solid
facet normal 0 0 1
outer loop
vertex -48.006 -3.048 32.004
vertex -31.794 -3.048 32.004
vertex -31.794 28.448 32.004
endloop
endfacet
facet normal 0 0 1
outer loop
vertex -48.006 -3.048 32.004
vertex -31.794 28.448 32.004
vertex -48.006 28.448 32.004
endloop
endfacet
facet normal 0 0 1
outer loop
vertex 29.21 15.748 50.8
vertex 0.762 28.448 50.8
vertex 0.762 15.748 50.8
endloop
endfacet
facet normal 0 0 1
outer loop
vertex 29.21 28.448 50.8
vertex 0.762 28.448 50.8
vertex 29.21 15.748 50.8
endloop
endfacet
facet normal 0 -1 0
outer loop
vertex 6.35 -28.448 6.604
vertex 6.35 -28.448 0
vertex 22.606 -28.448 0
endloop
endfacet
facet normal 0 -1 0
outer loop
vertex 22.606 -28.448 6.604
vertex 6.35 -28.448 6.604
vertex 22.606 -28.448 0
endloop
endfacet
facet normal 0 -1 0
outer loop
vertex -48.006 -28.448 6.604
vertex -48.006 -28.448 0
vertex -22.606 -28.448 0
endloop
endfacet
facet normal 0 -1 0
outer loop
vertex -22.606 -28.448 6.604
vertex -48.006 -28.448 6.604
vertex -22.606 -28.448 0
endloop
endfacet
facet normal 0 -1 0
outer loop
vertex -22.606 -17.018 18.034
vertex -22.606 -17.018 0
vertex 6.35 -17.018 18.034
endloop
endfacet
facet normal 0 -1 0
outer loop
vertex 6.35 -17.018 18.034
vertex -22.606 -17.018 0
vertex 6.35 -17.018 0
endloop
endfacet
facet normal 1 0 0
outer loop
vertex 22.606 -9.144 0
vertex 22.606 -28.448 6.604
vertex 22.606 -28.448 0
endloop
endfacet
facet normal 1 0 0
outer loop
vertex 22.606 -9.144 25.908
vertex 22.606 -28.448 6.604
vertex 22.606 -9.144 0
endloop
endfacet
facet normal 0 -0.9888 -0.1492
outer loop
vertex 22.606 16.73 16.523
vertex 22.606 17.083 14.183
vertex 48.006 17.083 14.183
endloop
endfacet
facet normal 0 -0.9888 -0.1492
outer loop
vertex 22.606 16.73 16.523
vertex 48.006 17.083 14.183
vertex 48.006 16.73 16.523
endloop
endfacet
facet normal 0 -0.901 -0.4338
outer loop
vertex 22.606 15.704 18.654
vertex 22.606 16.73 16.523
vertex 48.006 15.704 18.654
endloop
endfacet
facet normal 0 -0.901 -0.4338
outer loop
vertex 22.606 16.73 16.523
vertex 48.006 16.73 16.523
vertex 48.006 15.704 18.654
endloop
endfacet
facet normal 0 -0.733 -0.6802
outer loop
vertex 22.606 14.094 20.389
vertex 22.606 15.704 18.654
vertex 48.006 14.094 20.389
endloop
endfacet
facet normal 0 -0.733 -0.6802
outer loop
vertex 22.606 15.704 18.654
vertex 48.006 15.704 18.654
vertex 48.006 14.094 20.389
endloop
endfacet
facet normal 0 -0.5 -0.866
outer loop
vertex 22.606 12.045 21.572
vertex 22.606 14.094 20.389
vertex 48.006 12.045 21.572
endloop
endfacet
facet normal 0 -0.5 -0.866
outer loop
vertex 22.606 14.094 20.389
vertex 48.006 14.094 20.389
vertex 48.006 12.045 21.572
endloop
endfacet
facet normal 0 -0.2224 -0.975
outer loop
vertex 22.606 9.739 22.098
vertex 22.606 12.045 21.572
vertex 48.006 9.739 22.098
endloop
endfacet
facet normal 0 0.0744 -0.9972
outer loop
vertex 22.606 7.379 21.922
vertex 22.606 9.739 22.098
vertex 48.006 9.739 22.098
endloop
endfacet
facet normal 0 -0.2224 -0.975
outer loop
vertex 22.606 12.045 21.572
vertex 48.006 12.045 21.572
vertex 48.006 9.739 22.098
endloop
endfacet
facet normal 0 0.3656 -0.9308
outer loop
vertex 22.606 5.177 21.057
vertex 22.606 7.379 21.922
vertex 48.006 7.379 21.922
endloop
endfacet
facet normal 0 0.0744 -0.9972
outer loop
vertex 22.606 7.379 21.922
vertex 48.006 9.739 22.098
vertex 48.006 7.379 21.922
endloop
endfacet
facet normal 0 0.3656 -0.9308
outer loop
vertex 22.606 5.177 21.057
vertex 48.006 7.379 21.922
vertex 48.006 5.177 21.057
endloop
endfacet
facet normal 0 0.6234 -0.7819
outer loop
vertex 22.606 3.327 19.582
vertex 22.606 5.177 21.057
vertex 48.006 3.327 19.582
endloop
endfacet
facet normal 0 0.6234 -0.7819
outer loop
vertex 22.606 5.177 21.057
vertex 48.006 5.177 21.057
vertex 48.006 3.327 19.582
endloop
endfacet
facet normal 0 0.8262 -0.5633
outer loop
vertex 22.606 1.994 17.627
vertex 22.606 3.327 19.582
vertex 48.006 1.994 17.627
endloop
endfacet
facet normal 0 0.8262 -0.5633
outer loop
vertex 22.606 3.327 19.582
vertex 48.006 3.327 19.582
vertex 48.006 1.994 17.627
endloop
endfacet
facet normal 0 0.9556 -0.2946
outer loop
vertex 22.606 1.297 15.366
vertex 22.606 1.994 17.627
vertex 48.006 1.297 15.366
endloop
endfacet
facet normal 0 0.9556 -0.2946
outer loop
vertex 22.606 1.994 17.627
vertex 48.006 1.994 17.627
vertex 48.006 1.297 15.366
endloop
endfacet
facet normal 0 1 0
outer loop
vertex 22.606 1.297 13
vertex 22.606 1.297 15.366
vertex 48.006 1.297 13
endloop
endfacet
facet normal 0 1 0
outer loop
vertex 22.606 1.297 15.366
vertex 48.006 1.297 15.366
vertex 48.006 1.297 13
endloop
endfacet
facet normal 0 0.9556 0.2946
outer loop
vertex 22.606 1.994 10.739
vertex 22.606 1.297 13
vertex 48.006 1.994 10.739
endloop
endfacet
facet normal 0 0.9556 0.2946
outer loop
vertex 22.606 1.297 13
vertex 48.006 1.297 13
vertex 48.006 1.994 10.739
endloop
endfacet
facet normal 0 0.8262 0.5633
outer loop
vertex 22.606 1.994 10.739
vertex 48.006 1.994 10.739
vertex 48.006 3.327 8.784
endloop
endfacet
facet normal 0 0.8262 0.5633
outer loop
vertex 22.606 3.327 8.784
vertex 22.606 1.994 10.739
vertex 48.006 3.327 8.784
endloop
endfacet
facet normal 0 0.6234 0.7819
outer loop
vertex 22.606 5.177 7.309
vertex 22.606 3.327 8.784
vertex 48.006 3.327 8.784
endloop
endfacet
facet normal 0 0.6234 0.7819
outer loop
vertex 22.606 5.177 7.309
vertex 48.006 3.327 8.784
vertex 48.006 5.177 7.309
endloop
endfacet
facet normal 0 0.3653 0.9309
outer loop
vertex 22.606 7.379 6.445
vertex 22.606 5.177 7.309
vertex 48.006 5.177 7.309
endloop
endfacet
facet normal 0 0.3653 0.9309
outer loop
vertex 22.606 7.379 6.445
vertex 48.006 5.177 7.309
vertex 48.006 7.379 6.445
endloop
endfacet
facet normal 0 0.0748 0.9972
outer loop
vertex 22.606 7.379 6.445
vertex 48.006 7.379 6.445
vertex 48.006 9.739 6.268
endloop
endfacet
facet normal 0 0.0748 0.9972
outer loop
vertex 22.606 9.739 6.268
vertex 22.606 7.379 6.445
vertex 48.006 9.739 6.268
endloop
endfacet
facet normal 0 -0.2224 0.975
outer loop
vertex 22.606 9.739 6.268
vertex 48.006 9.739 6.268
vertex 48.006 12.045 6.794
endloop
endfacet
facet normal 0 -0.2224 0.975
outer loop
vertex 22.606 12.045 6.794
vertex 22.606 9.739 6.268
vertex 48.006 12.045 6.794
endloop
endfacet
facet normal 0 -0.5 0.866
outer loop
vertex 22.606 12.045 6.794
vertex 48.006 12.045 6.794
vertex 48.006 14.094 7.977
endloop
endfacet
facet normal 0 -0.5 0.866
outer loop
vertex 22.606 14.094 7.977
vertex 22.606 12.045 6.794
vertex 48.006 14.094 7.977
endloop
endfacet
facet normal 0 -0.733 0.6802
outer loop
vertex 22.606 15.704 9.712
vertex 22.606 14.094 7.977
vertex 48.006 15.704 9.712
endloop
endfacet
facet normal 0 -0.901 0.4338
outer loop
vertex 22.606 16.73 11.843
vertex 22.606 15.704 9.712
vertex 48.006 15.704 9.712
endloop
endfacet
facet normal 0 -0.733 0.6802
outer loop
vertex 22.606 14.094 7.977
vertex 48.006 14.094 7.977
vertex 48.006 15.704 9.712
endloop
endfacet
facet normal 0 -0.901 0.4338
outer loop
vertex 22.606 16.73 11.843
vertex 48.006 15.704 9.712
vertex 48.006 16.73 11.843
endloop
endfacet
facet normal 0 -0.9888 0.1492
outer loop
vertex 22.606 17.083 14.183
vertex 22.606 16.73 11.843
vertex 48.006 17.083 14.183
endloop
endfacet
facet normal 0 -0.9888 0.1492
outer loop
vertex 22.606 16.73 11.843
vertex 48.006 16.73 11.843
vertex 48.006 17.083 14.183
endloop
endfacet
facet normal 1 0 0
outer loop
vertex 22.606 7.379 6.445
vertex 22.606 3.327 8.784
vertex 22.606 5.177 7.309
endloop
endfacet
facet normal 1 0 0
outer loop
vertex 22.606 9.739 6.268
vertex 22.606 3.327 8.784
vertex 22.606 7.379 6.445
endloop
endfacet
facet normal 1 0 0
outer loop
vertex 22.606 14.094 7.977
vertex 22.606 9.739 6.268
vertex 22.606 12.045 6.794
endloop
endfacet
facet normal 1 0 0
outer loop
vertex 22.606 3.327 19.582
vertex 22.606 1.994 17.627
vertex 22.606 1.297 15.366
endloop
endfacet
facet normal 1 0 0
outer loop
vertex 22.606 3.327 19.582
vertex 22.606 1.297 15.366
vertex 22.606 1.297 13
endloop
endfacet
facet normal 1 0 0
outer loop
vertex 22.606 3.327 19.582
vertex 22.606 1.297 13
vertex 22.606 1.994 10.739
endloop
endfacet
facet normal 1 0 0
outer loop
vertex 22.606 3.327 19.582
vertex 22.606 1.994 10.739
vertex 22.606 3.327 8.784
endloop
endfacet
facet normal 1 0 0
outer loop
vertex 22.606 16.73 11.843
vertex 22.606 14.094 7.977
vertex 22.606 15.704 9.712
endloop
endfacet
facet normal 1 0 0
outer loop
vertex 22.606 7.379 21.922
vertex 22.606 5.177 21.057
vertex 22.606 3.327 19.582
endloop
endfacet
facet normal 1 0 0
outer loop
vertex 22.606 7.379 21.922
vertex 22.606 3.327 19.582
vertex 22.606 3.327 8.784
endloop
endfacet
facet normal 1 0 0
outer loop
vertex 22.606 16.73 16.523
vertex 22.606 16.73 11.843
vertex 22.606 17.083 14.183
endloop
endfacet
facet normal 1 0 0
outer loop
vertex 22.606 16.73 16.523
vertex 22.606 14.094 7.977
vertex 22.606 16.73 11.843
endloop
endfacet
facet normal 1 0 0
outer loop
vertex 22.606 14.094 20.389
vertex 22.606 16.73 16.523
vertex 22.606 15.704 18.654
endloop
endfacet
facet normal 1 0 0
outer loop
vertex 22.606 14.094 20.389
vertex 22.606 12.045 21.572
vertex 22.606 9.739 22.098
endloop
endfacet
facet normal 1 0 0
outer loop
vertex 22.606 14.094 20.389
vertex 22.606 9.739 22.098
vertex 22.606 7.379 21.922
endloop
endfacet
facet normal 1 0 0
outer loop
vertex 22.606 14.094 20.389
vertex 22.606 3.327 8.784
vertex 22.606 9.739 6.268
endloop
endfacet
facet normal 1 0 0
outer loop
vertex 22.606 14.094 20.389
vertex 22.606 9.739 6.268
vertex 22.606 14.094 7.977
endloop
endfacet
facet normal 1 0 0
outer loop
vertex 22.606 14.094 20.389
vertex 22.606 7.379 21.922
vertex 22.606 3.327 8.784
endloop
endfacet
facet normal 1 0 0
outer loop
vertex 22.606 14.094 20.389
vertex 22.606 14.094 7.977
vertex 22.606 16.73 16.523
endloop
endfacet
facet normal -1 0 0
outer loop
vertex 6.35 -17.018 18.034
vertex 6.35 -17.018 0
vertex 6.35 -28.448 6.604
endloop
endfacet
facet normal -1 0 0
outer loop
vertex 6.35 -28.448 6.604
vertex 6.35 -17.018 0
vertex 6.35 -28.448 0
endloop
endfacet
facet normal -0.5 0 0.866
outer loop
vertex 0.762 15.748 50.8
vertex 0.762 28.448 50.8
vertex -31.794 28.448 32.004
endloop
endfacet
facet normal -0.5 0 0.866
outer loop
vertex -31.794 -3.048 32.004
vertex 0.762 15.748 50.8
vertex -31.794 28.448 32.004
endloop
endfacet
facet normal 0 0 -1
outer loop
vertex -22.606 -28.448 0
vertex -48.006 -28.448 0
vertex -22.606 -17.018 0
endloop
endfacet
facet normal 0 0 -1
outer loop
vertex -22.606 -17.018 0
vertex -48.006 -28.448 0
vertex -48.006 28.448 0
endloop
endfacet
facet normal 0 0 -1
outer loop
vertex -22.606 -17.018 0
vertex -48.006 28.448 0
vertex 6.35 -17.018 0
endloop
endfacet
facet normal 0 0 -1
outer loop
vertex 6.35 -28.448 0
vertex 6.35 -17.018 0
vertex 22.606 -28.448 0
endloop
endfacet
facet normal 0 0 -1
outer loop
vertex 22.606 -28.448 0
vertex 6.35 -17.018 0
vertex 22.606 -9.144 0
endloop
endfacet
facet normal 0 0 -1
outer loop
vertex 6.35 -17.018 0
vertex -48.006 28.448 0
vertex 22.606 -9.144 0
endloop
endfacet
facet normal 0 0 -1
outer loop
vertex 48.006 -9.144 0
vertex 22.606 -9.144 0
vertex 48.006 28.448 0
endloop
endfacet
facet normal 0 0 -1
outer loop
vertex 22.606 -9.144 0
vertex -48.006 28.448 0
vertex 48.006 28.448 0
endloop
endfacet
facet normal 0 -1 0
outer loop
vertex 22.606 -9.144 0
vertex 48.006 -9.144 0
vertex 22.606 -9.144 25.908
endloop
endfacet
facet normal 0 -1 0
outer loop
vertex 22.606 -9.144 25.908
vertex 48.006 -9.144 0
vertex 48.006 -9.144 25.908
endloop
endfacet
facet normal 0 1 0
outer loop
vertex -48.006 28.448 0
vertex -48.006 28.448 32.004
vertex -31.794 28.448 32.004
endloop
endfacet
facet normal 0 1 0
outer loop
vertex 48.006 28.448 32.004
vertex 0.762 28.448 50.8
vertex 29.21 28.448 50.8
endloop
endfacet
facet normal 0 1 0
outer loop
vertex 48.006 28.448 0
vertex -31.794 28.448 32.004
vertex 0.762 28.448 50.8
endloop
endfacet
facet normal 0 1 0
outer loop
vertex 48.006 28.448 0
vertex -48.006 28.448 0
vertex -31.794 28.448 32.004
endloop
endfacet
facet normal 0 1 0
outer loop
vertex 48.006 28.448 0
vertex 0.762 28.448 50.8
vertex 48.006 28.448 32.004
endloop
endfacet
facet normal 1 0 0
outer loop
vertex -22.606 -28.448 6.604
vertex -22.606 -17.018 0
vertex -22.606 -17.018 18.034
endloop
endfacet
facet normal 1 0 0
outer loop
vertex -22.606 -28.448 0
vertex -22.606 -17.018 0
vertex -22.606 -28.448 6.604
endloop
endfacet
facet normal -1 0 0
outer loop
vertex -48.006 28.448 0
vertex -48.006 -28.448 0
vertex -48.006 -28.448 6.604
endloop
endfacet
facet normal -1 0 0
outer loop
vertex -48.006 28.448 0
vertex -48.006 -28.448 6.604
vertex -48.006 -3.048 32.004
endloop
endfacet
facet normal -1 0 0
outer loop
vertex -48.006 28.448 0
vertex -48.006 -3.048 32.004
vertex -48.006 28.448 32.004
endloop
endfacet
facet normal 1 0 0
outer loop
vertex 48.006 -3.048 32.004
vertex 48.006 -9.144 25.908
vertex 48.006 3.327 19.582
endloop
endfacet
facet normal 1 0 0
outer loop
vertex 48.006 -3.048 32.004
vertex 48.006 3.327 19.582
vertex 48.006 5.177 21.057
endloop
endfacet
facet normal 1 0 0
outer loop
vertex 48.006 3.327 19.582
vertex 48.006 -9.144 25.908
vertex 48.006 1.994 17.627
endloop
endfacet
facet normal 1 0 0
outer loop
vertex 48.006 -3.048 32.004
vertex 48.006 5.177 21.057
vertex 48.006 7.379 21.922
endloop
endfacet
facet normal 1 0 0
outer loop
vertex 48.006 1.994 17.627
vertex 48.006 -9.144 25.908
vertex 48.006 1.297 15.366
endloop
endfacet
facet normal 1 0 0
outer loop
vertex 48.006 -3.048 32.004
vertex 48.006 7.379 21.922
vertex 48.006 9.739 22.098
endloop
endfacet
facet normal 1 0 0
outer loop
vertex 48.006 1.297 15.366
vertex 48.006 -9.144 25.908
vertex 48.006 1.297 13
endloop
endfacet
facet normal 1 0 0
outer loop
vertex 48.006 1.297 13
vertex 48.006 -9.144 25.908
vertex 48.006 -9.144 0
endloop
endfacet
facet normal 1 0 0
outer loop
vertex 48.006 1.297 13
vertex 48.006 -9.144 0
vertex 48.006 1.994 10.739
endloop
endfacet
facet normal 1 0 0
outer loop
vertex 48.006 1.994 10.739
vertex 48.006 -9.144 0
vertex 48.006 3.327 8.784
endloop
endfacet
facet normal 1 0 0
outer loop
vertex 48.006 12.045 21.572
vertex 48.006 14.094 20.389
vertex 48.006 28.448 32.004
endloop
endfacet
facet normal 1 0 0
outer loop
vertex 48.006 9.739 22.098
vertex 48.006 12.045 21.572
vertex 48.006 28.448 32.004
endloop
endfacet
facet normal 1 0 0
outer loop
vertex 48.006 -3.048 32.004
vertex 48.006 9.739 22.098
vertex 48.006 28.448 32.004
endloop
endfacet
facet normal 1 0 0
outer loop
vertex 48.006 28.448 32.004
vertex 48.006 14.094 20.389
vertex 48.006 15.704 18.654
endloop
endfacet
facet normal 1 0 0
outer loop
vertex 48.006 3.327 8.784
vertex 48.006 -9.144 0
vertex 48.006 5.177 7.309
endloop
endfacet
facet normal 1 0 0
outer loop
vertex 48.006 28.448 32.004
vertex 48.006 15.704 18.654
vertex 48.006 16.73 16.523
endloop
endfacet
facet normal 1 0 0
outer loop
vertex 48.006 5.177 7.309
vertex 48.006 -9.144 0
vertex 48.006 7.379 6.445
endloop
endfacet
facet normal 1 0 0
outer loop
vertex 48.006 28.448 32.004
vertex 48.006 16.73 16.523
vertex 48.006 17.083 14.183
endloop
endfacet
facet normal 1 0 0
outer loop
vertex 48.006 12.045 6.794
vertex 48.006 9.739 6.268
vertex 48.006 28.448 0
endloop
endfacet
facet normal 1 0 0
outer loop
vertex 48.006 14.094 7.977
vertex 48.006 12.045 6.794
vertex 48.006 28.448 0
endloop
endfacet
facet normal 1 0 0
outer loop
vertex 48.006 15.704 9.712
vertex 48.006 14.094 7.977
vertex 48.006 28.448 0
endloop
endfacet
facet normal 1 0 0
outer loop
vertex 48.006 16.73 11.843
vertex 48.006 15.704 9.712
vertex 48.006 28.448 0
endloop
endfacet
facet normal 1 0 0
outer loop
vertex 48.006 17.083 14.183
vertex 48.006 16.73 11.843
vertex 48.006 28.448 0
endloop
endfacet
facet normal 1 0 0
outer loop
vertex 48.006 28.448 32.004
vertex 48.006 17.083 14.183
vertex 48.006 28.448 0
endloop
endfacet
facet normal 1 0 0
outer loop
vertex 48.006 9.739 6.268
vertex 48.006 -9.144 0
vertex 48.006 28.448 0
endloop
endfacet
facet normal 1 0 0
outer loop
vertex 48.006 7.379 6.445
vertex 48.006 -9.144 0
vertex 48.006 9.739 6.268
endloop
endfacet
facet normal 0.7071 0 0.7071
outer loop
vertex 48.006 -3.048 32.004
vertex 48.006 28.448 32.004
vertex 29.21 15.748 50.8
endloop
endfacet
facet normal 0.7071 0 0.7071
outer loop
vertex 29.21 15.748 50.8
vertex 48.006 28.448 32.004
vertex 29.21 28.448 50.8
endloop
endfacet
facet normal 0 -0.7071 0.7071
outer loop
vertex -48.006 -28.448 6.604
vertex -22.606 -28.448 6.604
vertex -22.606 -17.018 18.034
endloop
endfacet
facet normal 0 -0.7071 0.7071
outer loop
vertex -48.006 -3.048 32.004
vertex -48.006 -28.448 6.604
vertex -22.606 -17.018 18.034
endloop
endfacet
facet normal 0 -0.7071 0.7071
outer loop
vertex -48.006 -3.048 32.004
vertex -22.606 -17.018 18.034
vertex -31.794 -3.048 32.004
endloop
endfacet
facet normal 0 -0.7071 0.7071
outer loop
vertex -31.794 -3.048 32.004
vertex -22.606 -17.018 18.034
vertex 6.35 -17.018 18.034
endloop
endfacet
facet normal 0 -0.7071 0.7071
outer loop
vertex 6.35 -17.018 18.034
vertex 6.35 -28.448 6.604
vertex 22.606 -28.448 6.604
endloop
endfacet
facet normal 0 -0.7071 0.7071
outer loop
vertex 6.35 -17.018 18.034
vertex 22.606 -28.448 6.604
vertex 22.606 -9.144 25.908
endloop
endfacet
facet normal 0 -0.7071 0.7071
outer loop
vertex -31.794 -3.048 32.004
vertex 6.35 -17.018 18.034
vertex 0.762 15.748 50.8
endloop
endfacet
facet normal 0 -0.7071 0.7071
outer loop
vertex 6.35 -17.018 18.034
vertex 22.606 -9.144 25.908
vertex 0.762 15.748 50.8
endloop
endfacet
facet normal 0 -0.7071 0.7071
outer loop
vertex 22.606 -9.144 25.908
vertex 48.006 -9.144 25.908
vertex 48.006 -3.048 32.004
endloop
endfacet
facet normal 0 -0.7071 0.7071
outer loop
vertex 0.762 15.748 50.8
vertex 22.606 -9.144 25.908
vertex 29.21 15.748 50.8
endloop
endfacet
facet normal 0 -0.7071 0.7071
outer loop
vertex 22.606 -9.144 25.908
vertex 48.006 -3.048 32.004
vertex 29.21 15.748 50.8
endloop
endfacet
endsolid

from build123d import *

# Parameters (mm, degrees)
F0_W      = 96.012
F0_H      = 56.896
F1_DEPTH  = 50.8
F3_DEPTH  = 96.012
F5_DEPTH  = 31.75
F7_DEPTH  = 25.4
F8_W      = 28.956
F8_H      = 11.43
F9_DEPTH  = 59.436
F11_DEPTH = 37.084
F12_R     = 7.9375
F13_DEPTH = 25.4


with BuildPart() as f1:
    # F0 (on Top) → F1 (new body)
    with BuildSketch(Plane.XY):
        Rectangle(F0_W, F0_H)
    extrude(amount=F1_DEPTH)

    # F2 (on face) → F3 (cut)
    with BuildSketch(Plane.YZ.offset(48.006)):
        Polygon((-28.448, 6.604), (15.748, 50.8), (-28.448, 50.8), align=None)
    extrude(amount=-F3_DEPTH, mode=Mode.SUBTRACT)

    # F4 (on face) → F5 (cut)
    with BuildSketch(Plane(origin=(0, 28.448, 0), x_dir=(-1, 0, 0), z_dir=(0, 1, 0))):
        Polygon((-48.006, 32.004), (-29.21, 50.8), (-48.006, 50.8), align=None)
    extrude(amount=-F5_DEPTH, mode=Mode.SUBTRACT)

    # F6 (on face) → F7 (cut)
    with BuildSketch(Plane.YZ.offset(48.006)):
        Polygon((-9.144, 25.908), (-28.448, 6.604), (-28.448, 0), (-9.144, 0), align=None)
    extrude(amount=-F7_DEPTH, mode=Mode.SUBTRACT)

    # F8 (on face) → F9 (cut)
    with BuildSketch(Plane(origin=(0, 0, 0), x_dir=(1, 0, 0), z_dir=(0, 0, -1))):
        with Locations((-8.128, 22.733)):
            Rectangle(F8_W, F8_H)
    extrude(amount=-F9_DEPTH, mode=Mode.SUBTRACT)

    # F10 (on face) → F11 (cut)
    with BuildSketch(Plane(origin=(0, 28.448, 0), x_dir=(-1, 0, 0), z_dir=(0, 1, 0))):
        Polygon((48.006, 50.8), (-0.762, 50.8), (31.793627, 32.004), (48.006, 32.004), align=None)
    extrude(amount=-F11_DEPTH, mode=Mode.SUBTRACT)

    # F12 (on face) → F13 (cut)
    with BuildSketch(Plane.YZ.offset(48.006)):
        with Locations((9.145532, 14.183054)):
            Circle(F12_R)
    extrude(amount=-F13_DEPTH, mode=Mode.SUBTRACT)


solid = f1.part
